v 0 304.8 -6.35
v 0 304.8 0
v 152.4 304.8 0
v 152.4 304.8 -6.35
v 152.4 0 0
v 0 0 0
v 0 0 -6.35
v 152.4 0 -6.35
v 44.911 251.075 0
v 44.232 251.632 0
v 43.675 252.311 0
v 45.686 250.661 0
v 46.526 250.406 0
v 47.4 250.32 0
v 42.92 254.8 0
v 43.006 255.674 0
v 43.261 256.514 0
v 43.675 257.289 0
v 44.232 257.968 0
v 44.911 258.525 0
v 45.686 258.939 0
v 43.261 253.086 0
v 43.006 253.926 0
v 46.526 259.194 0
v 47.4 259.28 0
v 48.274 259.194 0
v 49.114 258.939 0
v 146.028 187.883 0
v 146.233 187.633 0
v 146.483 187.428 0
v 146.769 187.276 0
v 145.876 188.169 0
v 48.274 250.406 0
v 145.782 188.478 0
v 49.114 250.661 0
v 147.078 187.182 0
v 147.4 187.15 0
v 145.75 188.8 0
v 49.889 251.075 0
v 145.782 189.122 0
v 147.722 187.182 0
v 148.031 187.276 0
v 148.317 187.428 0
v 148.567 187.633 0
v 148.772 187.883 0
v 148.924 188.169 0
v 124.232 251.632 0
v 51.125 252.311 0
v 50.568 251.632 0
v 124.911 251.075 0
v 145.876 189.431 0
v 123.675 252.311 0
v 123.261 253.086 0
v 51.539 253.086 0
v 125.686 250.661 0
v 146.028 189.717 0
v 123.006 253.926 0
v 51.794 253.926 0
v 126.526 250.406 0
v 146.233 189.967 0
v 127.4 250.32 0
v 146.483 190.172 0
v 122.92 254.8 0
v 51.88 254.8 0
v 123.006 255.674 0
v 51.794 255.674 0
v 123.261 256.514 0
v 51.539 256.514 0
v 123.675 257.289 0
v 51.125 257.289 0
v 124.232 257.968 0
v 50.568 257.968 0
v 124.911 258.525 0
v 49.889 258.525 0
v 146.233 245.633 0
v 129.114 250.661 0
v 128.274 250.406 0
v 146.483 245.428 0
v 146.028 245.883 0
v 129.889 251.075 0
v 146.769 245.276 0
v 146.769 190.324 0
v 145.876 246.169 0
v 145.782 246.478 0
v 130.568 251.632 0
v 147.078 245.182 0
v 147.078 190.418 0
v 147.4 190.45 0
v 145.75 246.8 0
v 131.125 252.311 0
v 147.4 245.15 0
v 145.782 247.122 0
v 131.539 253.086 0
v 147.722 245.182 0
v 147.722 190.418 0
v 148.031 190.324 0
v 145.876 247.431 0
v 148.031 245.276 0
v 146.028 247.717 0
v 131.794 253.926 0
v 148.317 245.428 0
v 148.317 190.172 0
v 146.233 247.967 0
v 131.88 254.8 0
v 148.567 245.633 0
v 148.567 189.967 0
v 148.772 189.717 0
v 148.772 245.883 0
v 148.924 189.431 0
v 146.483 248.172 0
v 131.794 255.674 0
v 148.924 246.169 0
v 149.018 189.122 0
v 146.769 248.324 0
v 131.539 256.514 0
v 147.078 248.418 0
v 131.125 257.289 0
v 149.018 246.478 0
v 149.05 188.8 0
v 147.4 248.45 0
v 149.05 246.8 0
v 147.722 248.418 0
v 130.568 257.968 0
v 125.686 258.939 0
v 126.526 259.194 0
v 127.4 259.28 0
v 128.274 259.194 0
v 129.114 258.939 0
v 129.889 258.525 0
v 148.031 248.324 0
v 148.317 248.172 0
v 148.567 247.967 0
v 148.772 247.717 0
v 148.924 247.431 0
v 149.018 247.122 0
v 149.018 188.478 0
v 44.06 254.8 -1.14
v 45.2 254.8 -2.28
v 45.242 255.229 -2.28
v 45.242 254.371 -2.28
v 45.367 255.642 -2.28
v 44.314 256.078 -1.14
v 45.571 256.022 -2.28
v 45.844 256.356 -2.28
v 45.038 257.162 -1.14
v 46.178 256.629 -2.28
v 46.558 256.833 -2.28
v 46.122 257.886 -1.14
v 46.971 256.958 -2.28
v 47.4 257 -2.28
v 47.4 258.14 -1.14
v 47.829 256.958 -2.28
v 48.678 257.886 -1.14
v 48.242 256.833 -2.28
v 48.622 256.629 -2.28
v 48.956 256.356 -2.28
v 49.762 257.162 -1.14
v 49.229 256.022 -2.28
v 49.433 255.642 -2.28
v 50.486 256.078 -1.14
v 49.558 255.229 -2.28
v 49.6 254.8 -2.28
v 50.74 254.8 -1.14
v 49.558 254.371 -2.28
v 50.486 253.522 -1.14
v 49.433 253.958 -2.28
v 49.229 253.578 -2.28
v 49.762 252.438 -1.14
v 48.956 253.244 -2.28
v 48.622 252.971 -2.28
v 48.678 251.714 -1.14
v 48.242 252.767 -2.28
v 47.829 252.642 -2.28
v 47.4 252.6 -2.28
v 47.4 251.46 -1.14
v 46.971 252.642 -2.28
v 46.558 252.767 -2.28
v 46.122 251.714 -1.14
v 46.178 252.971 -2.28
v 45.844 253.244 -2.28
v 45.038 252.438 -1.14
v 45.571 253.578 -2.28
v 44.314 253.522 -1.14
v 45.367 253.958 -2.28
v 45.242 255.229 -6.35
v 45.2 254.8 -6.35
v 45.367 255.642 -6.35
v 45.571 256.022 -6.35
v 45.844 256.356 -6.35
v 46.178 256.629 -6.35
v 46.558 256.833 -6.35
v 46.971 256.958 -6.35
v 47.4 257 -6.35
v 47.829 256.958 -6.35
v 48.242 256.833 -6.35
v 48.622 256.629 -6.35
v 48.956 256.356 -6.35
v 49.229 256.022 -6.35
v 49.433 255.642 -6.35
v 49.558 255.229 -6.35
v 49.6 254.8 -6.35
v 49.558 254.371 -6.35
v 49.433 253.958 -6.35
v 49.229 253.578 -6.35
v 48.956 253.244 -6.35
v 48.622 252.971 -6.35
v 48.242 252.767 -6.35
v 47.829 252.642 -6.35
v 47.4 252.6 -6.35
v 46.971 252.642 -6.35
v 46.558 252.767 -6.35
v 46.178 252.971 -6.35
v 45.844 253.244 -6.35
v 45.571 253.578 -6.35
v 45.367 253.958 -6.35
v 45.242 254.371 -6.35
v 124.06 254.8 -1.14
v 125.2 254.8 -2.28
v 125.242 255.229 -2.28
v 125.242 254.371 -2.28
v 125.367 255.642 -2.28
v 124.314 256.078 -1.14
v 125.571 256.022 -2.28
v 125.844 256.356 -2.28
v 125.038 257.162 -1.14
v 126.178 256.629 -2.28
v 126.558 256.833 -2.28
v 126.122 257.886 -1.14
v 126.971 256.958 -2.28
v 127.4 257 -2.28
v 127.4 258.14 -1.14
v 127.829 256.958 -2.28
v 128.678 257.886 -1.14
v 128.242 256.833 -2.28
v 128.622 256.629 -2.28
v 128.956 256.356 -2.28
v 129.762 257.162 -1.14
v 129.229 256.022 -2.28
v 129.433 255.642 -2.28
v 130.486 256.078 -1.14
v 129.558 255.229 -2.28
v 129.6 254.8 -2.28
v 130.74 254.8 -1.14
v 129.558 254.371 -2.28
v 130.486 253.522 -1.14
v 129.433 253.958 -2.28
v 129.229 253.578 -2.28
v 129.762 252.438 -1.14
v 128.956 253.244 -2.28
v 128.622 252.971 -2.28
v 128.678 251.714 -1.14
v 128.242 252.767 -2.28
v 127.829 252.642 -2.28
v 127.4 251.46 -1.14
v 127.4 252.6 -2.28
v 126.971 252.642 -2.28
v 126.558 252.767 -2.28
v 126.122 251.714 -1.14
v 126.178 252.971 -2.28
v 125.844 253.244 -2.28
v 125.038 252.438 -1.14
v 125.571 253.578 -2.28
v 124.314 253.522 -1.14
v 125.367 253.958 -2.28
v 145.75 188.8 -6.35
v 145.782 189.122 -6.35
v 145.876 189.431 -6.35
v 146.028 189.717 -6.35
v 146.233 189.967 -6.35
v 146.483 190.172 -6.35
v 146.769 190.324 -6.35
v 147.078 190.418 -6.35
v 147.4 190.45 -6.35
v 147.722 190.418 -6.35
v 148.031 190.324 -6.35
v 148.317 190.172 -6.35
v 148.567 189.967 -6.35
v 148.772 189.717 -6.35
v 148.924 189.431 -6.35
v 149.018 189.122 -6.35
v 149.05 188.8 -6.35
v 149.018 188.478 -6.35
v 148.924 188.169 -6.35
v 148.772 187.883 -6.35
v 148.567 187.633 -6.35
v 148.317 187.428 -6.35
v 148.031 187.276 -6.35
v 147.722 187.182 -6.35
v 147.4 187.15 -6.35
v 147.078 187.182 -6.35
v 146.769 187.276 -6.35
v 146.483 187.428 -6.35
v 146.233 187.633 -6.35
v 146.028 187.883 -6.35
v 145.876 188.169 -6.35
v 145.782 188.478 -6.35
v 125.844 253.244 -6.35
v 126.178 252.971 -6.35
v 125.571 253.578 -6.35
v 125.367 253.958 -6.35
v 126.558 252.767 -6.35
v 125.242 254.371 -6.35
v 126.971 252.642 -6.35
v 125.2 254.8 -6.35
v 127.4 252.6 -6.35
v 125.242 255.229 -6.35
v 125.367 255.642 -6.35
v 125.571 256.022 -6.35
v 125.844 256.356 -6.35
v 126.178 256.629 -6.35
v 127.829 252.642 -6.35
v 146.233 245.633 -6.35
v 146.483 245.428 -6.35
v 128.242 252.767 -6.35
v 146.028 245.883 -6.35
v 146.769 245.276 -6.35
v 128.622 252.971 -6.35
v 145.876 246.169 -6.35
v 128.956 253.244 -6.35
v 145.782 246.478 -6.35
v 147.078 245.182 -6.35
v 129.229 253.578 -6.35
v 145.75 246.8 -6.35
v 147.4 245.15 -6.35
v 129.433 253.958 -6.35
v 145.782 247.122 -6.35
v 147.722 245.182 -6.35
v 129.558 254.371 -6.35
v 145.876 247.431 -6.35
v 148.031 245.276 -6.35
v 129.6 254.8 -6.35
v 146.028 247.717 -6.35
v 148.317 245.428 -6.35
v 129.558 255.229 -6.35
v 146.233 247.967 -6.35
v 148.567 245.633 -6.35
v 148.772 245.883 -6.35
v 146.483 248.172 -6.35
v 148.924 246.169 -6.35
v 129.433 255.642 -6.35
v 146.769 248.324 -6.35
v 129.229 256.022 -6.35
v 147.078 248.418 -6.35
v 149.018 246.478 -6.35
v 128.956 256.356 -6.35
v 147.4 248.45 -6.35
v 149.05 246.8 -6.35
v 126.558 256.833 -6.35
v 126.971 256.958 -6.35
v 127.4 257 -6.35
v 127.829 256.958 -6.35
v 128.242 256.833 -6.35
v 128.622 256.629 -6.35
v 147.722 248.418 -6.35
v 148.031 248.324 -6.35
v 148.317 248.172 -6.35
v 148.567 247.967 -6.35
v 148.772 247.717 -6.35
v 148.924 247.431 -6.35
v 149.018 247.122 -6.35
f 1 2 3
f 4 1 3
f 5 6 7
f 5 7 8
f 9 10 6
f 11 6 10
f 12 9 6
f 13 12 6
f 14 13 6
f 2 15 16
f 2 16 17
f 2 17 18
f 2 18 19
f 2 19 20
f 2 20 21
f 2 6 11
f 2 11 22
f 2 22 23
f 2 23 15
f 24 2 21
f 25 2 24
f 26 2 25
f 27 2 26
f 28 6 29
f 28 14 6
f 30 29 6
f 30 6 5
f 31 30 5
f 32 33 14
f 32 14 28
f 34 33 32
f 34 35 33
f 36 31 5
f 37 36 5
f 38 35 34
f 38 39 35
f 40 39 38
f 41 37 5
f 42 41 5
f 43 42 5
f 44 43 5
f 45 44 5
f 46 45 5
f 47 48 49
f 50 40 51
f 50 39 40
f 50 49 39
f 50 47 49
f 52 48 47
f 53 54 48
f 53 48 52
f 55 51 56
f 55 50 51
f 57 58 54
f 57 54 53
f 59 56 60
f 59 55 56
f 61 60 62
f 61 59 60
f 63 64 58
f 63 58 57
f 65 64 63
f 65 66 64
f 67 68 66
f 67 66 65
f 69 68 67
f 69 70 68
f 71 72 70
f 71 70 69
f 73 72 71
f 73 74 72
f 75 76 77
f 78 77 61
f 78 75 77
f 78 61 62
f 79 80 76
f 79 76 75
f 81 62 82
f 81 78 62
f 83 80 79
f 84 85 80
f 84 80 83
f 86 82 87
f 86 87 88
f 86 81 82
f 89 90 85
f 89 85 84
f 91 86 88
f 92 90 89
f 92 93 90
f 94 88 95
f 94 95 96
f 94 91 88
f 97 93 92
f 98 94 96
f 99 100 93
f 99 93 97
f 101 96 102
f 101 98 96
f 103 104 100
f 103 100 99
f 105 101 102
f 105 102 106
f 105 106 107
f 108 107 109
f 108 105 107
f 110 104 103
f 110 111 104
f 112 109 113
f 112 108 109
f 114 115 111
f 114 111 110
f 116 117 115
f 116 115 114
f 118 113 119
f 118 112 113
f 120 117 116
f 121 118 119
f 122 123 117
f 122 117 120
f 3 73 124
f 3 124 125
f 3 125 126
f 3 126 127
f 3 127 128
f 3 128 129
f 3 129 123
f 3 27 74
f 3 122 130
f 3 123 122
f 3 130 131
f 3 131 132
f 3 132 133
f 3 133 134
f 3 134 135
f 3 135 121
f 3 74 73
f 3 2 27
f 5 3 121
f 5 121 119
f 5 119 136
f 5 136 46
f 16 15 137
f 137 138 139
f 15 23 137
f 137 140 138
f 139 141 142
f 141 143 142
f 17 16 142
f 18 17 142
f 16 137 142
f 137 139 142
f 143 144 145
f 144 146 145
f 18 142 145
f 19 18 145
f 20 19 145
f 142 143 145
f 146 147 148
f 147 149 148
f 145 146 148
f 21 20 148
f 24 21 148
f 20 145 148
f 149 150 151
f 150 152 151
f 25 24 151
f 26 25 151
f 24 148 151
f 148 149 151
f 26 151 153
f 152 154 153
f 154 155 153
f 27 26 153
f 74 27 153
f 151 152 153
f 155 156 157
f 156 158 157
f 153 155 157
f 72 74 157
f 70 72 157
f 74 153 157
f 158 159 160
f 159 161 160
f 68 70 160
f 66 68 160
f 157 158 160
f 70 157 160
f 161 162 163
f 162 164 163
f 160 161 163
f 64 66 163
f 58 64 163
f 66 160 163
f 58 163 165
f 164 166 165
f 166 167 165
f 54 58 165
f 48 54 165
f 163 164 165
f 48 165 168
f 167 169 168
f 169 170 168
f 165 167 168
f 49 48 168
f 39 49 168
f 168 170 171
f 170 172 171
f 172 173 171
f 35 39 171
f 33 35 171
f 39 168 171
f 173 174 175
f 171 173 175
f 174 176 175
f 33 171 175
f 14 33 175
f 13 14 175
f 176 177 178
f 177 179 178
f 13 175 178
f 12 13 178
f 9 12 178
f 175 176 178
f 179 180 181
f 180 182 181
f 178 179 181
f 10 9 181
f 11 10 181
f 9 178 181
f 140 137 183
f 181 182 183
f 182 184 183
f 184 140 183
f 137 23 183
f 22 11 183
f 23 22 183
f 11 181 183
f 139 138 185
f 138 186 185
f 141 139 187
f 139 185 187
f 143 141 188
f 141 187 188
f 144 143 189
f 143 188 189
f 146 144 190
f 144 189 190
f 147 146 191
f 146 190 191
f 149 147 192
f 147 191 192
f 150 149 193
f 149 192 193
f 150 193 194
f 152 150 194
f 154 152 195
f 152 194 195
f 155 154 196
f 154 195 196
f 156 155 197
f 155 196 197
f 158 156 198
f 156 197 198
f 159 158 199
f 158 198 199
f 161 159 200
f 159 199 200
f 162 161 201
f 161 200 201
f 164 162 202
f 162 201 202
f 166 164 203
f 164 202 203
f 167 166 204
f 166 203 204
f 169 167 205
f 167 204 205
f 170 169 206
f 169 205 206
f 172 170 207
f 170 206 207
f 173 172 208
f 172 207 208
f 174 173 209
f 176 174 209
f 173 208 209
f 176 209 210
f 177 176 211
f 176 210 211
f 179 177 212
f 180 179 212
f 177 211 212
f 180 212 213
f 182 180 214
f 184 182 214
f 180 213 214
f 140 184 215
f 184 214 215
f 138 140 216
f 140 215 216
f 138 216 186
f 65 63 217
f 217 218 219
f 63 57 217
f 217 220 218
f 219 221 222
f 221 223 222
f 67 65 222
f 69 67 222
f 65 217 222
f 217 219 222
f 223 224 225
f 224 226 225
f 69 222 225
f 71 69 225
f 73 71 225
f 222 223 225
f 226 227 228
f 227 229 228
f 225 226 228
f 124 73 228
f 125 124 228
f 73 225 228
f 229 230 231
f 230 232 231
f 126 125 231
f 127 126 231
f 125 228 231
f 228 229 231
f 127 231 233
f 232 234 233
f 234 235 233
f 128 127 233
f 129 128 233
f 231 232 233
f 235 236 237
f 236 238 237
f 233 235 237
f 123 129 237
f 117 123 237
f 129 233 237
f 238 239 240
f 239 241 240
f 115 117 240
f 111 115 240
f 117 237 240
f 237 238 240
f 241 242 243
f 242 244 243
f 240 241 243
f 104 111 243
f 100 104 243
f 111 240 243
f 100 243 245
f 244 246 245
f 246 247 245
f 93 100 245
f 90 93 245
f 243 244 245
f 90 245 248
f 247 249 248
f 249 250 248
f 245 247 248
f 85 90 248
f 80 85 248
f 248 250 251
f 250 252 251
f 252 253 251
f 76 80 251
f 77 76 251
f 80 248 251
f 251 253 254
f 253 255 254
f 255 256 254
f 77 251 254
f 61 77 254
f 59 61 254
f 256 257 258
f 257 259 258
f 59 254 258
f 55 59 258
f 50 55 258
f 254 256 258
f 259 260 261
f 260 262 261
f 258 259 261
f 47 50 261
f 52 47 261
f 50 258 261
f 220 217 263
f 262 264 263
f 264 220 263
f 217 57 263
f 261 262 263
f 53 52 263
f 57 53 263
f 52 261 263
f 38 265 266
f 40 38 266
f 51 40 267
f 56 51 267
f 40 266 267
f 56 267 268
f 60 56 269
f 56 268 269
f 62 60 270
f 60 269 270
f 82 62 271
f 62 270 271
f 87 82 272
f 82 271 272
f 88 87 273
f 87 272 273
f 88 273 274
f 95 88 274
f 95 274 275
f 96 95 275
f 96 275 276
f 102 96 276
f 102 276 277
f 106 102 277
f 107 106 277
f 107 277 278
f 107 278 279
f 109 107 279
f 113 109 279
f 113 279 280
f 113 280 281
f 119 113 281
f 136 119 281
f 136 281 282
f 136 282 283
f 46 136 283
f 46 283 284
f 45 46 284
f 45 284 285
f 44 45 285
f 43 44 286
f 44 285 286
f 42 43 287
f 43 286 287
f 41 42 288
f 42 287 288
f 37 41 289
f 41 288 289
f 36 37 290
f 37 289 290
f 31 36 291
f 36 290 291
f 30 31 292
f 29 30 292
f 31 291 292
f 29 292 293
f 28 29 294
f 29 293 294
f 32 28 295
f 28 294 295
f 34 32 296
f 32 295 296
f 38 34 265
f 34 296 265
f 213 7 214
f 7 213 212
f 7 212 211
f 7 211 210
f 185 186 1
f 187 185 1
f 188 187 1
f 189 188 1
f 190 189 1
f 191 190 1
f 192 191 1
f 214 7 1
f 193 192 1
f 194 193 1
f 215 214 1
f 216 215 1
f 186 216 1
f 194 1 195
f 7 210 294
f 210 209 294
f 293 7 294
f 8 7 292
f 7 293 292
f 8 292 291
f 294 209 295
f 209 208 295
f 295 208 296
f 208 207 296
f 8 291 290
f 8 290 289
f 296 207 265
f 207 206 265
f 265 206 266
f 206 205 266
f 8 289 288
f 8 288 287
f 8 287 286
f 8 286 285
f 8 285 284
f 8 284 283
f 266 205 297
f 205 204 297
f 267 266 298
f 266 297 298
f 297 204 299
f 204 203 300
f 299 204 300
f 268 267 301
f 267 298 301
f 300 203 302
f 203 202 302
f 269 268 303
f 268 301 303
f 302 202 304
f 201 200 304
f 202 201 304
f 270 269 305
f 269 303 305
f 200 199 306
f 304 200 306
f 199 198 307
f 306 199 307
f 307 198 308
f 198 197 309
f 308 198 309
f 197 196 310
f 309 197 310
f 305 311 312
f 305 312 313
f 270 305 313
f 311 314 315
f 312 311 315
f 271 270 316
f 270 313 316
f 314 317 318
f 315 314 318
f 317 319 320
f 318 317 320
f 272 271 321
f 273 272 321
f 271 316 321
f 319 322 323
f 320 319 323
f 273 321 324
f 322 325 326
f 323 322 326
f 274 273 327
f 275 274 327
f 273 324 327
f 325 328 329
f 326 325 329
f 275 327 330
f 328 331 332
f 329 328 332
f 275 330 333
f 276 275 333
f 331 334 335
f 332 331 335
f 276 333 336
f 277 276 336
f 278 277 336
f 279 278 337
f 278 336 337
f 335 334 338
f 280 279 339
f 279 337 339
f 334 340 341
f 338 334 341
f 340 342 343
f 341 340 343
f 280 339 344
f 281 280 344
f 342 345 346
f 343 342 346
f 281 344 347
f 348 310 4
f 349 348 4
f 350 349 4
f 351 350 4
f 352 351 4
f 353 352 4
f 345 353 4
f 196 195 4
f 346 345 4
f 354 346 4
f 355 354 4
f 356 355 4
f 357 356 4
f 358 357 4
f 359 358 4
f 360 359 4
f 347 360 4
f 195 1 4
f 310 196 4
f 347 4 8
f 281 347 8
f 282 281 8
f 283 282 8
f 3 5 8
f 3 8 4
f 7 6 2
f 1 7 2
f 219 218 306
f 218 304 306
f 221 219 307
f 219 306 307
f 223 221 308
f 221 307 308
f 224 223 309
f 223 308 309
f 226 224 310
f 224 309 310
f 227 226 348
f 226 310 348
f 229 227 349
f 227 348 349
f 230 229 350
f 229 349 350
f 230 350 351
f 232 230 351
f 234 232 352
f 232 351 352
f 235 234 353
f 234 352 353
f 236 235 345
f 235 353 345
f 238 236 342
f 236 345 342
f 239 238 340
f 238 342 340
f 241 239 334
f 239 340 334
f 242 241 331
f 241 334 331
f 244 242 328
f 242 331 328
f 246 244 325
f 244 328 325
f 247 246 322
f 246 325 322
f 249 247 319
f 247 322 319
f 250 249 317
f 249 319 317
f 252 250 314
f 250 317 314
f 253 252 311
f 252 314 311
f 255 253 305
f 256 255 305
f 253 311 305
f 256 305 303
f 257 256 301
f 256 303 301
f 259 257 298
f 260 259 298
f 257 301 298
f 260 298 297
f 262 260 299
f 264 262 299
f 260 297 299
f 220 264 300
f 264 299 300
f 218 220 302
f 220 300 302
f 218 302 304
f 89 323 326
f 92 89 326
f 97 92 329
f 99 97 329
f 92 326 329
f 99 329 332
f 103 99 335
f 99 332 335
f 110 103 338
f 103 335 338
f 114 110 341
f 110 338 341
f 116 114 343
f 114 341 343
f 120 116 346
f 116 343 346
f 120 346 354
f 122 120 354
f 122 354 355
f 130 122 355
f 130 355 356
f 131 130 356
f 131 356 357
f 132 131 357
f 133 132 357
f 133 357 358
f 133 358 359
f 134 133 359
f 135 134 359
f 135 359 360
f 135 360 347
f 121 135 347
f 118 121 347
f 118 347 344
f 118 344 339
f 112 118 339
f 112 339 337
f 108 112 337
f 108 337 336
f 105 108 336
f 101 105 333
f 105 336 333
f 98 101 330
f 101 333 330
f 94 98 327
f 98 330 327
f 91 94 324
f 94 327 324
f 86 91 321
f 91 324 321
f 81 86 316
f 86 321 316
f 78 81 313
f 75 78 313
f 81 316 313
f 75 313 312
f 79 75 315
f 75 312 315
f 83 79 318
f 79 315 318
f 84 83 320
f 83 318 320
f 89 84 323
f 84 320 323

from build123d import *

# Parameters (mm, degrees)
F0_W           = 152.4
F0_H           = 304.8
F1_DEPTH       = 6.35
F3_D           = 4.4
F3_CSINK_D     = 8.96
F3_CSINK_ANGLE = 90
F5_D           = 3.3


with BuildPart() as f1:
    # F0 (on Top) → F1 (new body)
    with BuildSketch(Plane.XY):
        with Locations((76.2, 152.4)):
            Rectangle(F0_W, F0_H)
    extrude(amount=-F1_DEPTH)

    # F3 (through all)
    with Locations(Plane.XY):
        with Locations((127.4, 254.8), (47.4, 254.8)):
            CounterSinkHole(F3_D / 2, F3_CSINK_D / 2, counter_sink_angle=F3_CSINK_ANGLE)

    # F5 (through all)
    with Locations(Plane.XY):
        with Locations((147.4, 246.8), (147.4, 188.8)):
            Hole(F5_D / 2)


solid = f1.part
